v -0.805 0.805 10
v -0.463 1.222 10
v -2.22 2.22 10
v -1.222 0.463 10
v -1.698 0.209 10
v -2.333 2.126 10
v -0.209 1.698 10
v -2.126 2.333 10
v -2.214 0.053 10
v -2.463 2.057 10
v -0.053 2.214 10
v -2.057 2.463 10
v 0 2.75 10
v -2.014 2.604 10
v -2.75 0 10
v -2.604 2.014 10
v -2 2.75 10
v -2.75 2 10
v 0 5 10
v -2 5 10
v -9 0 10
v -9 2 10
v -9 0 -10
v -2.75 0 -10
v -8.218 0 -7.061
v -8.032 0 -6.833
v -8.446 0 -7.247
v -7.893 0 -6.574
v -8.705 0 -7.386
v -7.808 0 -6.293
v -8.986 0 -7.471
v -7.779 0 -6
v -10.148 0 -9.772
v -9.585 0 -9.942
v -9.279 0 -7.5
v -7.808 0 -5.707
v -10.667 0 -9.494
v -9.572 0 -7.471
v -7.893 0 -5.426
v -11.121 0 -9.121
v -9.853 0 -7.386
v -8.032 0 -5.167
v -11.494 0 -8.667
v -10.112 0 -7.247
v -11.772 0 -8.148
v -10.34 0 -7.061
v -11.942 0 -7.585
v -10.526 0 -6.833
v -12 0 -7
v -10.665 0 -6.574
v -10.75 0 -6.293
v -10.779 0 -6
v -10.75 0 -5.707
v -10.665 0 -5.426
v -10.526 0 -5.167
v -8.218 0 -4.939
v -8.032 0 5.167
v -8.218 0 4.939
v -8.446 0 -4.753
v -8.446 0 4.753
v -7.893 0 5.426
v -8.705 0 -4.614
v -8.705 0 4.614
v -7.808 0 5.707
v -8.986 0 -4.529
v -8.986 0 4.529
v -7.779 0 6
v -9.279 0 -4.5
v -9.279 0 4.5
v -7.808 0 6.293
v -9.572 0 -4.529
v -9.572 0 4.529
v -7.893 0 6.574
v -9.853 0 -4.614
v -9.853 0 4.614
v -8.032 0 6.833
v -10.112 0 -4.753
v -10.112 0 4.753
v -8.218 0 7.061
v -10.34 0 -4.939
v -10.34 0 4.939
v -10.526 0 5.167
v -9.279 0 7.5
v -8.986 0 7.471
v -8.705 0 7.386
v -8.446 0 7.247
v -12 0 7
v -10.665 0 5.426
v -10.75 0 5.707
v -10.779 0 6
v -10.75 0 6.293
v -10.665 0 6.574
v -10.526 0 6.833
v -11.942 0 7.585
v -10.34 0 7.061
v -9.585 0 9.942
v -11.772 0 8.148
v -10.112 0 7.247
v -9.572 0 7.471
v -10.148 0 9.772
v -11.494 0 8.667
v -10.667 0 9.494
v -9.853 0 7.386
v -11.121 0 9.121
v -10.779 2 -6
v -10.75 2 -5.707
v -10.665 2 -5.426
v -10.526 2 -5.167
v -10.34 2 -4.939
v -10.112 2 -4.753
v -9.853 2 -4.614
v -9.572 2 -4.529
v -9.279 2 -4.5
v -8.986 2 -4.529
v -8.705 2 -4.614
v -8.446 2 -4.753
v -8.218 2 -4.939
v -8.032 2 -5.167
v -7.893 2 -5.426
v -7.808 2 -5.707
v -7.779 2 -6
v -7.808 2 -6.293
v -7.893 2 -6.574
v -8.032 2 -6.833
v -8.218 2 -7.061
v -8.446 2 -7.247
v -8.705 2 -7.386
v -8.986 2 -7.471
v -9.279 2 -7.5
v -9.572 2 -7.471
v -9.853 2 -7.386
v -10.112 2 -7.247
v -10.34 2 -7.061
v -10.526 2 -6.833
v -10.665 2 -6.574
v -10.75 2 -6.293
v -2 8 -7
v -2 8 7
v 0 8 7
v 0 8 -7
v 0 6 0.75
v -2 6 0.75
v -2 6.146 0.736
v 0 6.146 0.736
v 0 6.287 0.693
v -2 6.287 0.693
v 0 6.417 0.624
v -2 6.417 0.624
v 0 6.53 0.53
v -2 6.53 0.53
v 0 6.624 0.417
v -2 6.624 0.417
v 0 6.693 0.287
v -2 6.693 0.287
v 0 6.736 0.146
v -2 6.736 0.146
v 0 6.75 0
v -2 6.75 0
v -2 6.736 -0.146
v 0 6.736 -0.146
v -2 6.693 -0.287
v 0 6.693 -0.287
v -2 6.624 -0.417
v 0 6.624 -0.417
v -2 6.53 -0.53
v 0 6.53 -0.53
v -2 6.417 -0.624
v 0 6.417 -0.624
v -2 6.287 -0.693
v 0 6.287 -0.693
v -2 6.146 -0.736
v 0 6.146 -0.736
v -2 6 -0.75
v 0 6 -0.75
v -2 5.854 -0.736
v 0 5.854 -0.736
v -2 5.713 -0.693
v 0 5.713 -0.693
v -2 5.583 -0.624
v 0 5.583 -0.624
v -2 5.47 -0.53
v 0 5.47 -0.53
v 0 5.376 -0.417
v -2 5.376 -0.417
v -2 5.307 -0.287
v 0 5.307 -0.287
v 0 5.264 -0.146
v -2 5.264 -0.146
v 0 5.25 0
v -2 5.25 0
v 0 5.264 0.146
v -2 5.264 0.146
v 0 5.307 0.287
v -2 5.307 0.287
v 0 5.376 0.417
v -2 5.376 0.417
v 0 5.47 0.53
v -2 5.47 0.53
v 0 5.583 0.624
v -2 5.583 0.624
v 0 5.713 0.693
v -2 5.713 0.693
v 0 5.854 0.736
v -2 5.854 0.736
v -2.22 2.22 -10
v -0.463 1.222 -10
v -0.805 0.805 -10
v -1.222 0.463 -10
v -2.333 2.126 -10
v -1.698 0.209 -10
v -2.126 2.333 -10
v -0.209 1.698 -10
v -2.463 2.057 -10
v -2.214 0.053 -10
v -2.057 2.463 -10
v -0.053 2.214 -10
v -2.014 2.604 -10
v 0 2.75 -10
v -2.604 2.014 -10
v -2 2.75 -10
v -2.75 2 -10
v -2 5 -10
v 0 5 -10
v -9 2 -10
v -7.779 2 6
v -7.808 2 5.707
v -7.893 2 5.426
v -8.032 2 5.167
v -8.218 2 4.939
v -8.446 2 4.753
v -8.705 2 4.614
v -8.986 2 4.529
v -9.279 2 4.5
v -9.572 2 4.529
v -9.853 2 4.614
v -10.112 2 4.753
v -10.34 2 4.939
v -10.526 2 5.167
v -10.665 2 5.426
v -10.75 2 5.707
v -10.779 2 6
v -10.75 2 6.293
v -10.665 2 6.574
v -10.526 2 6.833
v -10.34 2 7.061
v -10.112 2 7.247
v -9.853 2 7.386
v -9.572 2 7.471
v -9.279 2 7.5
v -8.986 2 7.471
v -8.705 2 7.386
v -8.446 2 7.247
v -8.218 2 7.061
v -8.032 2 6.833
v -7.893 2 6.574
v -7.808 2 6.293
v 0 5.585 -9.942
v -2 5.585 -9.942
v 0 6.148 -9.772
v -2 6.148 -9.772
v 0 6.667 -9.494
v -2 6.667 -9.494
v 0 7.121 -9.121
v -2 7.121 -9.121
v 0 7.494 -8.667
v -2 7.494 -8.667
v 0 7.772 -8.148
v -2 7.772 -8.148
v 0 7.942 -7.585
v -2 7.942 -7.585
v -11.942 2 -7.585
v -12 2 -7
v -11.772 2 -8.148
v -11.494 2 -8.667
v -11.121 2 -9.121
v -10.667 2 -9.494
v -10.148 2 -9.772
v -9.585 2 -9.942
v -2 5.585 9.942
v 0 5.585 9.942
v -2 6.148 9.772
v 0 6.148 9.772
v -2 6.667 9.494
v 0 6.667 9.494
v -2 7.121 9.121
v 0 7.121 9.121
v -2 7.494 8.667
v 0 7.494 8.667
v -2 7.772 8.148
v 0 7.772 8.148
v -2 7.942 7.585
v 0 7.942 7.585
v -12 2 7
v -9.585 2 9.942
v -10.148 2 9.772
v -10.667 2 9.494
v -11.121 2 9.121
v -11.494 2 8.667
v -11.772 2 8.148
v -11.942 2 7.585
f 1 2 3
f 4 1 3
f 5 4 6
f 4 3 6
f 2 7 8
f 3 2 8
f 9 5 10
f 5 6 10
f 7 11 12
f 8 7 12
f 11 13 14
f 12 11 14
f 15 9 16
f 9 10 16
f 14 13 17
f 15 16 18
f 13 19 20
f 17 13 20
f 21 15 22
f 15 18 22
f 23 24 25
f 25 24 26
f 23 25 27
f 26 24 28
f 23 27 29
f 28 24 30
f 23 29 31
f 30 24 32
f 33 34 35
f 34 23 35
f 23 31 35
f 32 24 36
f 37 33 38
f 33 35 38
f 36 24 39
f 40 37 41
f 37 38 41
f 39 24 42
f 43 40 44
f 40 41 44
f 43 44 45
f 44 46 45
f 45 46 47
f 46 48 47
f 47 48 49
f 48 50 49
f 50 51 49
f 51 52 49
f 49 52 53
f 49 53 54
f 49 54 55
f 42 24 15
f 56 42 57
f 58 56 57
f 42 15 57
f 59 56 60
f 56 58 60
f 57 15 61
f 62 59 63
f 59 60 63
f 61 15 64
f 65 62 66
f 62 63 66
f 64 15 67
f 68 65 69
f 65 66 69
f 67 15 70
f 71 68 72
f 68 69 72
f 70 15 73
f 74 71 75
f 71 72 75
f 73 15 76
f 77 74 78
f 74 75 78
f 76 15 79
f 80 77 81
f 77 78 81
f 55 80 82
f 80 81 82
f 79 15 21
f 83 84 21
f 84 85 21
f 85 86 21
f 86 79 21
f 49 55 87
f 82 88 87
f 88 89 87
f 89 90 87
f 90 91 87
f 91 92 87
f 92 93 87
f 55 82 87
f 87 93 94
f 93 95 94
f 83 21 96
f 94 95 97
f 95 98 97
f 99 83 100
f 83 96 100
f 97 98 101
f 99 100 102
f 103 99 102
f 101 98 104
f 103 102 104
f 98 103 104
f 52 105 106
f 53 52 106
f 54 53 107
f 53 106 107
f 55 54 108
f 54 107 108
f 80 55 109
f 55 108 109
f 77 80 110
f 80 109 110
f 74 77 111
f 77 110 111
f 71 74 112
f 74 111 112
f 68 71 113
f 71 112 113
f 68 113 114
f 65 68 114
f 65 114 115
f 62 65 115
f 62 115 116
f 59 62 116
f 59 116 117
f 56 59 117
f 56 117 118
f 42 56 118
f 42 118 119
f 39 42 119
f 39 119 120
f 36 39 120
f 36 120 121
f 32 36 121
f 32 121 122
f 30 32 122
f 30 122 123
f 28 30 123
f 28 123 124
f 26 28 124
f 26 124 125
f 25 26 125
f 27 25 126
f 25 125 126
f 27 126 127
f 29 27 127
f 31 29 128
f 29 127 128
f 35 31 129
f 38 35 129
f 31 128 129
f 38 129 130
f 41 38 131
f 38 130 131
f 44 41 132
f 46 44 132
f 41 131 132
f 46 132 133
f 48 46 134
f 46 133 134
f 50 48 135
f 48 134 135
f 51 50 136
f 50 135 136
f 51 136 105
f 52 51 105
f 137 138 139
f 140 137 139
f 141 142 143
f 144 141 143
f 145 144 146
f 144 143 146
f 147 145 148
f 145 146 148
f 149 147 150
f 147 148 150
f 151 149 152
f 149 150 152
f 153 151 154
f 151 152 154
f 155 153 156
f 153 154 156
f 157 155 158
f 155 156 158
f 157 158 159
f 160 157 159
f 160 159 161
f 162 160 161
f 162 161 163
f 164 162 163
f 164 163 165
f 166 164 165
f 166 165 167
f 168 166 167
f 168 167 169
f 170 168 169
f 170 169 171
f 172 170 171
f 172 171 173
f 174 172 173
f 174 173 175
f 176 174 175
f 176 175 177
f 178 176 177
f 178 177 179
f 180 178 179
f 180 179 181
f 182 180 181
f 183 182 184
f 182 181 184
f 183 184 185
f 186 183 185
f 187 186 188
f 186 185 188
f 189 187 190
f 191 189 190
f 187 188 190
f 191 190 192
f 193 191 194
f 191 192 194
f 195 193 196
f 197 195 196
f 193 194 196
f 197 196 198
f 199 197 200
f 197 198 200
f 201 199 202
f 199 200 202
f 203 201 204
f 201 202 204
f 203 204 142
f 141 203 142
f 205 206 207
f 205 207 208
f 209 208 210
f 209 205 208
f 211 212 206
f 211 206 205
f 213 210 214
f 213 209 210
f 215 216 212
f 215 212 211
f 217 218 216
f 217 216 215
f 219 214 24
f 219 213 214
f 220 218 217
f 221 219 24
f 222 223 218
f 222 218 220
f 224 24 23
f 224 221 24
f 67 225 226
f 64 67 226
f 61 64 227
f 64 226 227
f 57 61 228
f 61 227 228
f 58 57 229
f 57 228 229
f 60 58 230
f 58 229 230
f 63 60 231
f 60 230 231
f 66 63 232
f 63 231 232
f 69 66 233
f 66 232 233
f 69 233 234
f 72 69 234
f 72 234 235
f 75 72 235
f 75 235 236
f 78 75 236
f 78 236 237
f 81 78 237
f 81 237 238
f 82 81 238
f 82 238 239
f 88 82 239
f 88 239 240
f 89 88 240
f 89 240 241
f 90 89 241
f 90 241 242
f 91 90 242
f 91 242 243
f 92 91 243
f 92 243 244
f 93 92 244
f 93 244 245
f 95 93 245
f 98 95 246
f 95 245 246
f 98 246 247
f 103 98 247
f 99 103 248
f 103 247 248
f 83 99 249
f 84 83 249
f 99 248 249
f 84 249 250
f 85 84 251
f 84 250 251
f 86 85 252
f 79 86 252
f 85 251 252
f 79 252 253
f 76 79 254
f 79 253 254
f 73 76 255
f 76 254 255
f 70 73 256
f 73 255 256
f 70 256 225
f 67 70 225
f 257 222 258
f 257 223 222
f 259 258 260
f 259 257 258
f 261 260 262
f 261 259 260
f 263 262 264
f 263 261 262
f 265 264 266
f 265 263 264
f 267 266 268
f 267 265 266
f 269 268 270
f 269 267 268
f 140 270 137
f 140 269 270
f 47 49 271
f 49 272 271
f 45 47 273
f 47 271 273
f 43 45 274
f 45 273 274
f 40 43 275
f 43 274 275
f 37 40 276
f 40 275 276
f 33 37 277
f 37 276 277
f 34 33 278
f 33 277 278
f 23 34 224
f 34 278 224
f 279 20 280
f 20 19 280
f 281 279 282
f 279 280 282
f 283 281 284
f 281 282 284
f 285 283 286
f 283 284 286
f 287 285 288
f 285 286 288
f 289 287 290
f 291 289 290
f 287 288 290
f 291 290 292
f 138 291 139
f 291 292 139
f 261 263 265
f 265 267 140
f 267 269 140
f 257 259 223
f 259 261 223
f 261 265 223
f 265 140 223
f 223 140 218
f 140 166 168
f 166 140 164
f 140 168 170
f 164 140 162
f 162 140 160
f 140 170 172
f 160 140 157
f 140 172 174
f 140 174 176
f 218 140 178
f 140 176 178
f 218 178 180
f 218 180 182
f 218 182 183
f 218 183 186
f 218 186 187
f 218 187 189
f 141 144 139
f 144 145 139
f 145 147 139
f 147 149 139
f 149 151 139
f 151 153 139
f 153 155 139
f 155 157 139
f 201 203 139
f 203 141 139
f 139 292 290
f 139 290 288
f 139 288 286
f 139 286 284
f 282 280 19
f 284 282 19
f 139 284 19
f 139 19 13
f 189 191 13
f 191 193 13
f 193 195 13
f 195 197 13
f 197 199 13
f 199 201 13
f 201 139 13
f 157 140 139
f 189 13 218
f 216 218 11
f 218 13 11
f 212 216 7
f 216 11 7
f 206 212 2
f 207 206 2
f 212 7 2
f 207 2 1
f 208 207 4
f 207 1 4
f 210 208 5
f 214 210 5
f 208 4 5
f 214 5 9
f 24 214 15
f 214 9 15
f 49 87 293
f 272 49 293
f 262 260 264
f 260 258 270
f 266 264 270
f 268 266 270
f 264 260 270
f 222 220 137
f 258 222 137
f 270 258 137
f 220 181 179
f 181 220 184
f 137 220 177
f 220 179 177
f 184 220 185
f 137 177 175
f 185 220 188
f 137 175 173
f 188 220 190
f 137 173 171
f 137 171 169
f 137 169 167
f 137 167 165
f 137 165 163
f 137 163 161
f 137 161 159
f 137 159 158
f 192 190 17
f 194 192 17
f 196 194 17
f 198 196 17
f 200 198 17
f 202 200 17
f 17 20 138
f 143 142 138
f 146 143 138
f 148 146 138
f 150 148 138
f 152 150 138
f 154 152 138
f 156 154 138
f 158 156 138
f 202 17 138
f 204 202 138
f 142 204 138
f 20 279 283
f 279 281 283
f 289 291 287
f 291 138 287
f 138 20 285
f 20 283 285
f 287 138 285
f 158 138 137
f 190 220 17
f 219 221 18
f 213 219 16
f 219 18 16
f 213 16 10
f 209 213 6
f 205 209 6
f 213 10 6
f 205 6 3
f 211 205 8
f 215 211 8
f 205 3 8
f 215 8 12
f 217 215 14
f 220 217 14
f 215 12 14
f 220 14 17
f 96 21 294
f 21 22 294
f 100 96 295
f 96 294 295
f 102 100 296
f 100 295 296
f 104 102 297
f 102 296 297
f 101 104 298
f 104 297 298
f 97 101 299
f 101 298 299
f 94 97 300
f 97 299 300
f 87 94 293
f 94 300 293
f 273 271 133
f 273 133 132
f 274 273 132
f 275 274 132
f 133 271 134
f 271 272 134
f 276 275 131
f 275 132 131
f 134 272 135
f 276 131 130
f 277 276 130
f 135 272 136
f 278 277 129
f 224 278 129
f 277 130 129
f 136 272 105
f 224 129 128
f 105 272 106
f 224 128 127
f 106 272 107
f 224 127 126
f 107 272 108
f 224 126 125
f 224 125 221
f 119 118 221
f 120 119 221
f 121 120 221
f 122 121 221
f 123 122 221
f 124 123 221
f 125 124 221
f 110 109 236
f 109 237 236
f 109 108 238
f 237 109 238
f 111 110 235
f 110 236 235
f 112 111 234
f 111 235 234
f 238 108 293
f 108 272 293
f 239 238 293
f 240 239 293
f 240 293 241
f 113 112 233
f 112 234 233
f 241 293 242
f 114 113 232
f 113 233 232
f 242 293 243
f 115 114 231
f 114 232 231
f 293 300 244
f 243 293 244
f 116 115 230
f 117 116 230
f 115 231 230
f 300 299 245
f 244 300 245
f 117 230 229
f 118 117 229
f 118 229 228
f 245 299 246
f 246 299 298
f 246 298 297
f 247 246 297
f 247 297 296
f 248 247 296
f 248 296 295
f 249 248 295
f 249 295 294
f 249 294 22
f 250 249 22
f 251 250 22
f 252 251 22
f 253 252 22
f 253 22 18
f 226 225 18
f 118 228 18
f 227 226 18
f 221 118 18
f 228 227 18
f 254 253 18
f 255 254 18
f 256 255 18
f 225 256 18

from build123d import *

# Parameters (mm, degrees)
BASE_FLANGE1_DEPTH = 10
FILLET1_R          = 3
SKETCH6_R          = 1.5
CUT_EXTRUDE1_DEPTH = 17.733200531
SKETCH7_R          = 0.75
CUT_EXTRUDE2_DEPTH = 17.248076809


# Sheet-metal steps are written as plain solids
with BuildPart() as part:
    # Sketch1 → Base-Flange1 (new, symmetric)
    with BuildSketch(Plane.XY):
        with BuildLine():
            Line((0, 8), (0, 2.75))
            ThreePointArc((0, 2.75), (-0.805456352, 0.805456352), (-2.75, 0))
            Line((-2.75, 0), (-12, 0))
            Line((-12, 0), (-12, 2))
            Line((-12, 2), (-2.75, 2))
            ThreePointArc((-2.75, 2), (-2.219669914, 2.219669914), (-2, 2.75))
            Line((-2, 2.75), (-2, 8))
            Line((-2, 8), (0, 8))
        make_face()
    extrude(amount=BASE_FLANGE1_DEPTH, both=True)

    # Fillet1
    fillet1_edges = [part.edges().sort_by_distance(p)[0] for p in [
        (-1, 8, 10),
        (-12, 1, 10),
        (-1, 8, -10),
        (-12, 1, -10),
    ]]
    fillet(fillet1_edges, radius=FILLET1_R)

    # Sketch6 → Cut-Extrude1 (cut, through all)
    with BuildSketch(Plane(origin=(0, 2, 0), x_dir=(1, 0, 0), z_dir=(0, 1, 0))):
        with Locations(Location((-9.278968908, 6, 0), (0, 0, 180))):
            Circle(SKETCH6_R)
        with Locations((-9.278968908, -6)):
            Circle(SKETCH6_R)
    extrude(amount=-CUT_EXTRUDE1_DEPTH, mode=Mode.SUBTRACT)

    # Sketch7 → Cut-Extrude2 (cut, through all)
    with BuildSketch(Plane.ZY.offset(2)):
        with Locations((0, 6)):
            Circle(SKETCH7_R)
    extrude(amount=-CUT_EXTRUDE2_DEPTH, mode=Mode.SUBTRACT)


solid = part.part
